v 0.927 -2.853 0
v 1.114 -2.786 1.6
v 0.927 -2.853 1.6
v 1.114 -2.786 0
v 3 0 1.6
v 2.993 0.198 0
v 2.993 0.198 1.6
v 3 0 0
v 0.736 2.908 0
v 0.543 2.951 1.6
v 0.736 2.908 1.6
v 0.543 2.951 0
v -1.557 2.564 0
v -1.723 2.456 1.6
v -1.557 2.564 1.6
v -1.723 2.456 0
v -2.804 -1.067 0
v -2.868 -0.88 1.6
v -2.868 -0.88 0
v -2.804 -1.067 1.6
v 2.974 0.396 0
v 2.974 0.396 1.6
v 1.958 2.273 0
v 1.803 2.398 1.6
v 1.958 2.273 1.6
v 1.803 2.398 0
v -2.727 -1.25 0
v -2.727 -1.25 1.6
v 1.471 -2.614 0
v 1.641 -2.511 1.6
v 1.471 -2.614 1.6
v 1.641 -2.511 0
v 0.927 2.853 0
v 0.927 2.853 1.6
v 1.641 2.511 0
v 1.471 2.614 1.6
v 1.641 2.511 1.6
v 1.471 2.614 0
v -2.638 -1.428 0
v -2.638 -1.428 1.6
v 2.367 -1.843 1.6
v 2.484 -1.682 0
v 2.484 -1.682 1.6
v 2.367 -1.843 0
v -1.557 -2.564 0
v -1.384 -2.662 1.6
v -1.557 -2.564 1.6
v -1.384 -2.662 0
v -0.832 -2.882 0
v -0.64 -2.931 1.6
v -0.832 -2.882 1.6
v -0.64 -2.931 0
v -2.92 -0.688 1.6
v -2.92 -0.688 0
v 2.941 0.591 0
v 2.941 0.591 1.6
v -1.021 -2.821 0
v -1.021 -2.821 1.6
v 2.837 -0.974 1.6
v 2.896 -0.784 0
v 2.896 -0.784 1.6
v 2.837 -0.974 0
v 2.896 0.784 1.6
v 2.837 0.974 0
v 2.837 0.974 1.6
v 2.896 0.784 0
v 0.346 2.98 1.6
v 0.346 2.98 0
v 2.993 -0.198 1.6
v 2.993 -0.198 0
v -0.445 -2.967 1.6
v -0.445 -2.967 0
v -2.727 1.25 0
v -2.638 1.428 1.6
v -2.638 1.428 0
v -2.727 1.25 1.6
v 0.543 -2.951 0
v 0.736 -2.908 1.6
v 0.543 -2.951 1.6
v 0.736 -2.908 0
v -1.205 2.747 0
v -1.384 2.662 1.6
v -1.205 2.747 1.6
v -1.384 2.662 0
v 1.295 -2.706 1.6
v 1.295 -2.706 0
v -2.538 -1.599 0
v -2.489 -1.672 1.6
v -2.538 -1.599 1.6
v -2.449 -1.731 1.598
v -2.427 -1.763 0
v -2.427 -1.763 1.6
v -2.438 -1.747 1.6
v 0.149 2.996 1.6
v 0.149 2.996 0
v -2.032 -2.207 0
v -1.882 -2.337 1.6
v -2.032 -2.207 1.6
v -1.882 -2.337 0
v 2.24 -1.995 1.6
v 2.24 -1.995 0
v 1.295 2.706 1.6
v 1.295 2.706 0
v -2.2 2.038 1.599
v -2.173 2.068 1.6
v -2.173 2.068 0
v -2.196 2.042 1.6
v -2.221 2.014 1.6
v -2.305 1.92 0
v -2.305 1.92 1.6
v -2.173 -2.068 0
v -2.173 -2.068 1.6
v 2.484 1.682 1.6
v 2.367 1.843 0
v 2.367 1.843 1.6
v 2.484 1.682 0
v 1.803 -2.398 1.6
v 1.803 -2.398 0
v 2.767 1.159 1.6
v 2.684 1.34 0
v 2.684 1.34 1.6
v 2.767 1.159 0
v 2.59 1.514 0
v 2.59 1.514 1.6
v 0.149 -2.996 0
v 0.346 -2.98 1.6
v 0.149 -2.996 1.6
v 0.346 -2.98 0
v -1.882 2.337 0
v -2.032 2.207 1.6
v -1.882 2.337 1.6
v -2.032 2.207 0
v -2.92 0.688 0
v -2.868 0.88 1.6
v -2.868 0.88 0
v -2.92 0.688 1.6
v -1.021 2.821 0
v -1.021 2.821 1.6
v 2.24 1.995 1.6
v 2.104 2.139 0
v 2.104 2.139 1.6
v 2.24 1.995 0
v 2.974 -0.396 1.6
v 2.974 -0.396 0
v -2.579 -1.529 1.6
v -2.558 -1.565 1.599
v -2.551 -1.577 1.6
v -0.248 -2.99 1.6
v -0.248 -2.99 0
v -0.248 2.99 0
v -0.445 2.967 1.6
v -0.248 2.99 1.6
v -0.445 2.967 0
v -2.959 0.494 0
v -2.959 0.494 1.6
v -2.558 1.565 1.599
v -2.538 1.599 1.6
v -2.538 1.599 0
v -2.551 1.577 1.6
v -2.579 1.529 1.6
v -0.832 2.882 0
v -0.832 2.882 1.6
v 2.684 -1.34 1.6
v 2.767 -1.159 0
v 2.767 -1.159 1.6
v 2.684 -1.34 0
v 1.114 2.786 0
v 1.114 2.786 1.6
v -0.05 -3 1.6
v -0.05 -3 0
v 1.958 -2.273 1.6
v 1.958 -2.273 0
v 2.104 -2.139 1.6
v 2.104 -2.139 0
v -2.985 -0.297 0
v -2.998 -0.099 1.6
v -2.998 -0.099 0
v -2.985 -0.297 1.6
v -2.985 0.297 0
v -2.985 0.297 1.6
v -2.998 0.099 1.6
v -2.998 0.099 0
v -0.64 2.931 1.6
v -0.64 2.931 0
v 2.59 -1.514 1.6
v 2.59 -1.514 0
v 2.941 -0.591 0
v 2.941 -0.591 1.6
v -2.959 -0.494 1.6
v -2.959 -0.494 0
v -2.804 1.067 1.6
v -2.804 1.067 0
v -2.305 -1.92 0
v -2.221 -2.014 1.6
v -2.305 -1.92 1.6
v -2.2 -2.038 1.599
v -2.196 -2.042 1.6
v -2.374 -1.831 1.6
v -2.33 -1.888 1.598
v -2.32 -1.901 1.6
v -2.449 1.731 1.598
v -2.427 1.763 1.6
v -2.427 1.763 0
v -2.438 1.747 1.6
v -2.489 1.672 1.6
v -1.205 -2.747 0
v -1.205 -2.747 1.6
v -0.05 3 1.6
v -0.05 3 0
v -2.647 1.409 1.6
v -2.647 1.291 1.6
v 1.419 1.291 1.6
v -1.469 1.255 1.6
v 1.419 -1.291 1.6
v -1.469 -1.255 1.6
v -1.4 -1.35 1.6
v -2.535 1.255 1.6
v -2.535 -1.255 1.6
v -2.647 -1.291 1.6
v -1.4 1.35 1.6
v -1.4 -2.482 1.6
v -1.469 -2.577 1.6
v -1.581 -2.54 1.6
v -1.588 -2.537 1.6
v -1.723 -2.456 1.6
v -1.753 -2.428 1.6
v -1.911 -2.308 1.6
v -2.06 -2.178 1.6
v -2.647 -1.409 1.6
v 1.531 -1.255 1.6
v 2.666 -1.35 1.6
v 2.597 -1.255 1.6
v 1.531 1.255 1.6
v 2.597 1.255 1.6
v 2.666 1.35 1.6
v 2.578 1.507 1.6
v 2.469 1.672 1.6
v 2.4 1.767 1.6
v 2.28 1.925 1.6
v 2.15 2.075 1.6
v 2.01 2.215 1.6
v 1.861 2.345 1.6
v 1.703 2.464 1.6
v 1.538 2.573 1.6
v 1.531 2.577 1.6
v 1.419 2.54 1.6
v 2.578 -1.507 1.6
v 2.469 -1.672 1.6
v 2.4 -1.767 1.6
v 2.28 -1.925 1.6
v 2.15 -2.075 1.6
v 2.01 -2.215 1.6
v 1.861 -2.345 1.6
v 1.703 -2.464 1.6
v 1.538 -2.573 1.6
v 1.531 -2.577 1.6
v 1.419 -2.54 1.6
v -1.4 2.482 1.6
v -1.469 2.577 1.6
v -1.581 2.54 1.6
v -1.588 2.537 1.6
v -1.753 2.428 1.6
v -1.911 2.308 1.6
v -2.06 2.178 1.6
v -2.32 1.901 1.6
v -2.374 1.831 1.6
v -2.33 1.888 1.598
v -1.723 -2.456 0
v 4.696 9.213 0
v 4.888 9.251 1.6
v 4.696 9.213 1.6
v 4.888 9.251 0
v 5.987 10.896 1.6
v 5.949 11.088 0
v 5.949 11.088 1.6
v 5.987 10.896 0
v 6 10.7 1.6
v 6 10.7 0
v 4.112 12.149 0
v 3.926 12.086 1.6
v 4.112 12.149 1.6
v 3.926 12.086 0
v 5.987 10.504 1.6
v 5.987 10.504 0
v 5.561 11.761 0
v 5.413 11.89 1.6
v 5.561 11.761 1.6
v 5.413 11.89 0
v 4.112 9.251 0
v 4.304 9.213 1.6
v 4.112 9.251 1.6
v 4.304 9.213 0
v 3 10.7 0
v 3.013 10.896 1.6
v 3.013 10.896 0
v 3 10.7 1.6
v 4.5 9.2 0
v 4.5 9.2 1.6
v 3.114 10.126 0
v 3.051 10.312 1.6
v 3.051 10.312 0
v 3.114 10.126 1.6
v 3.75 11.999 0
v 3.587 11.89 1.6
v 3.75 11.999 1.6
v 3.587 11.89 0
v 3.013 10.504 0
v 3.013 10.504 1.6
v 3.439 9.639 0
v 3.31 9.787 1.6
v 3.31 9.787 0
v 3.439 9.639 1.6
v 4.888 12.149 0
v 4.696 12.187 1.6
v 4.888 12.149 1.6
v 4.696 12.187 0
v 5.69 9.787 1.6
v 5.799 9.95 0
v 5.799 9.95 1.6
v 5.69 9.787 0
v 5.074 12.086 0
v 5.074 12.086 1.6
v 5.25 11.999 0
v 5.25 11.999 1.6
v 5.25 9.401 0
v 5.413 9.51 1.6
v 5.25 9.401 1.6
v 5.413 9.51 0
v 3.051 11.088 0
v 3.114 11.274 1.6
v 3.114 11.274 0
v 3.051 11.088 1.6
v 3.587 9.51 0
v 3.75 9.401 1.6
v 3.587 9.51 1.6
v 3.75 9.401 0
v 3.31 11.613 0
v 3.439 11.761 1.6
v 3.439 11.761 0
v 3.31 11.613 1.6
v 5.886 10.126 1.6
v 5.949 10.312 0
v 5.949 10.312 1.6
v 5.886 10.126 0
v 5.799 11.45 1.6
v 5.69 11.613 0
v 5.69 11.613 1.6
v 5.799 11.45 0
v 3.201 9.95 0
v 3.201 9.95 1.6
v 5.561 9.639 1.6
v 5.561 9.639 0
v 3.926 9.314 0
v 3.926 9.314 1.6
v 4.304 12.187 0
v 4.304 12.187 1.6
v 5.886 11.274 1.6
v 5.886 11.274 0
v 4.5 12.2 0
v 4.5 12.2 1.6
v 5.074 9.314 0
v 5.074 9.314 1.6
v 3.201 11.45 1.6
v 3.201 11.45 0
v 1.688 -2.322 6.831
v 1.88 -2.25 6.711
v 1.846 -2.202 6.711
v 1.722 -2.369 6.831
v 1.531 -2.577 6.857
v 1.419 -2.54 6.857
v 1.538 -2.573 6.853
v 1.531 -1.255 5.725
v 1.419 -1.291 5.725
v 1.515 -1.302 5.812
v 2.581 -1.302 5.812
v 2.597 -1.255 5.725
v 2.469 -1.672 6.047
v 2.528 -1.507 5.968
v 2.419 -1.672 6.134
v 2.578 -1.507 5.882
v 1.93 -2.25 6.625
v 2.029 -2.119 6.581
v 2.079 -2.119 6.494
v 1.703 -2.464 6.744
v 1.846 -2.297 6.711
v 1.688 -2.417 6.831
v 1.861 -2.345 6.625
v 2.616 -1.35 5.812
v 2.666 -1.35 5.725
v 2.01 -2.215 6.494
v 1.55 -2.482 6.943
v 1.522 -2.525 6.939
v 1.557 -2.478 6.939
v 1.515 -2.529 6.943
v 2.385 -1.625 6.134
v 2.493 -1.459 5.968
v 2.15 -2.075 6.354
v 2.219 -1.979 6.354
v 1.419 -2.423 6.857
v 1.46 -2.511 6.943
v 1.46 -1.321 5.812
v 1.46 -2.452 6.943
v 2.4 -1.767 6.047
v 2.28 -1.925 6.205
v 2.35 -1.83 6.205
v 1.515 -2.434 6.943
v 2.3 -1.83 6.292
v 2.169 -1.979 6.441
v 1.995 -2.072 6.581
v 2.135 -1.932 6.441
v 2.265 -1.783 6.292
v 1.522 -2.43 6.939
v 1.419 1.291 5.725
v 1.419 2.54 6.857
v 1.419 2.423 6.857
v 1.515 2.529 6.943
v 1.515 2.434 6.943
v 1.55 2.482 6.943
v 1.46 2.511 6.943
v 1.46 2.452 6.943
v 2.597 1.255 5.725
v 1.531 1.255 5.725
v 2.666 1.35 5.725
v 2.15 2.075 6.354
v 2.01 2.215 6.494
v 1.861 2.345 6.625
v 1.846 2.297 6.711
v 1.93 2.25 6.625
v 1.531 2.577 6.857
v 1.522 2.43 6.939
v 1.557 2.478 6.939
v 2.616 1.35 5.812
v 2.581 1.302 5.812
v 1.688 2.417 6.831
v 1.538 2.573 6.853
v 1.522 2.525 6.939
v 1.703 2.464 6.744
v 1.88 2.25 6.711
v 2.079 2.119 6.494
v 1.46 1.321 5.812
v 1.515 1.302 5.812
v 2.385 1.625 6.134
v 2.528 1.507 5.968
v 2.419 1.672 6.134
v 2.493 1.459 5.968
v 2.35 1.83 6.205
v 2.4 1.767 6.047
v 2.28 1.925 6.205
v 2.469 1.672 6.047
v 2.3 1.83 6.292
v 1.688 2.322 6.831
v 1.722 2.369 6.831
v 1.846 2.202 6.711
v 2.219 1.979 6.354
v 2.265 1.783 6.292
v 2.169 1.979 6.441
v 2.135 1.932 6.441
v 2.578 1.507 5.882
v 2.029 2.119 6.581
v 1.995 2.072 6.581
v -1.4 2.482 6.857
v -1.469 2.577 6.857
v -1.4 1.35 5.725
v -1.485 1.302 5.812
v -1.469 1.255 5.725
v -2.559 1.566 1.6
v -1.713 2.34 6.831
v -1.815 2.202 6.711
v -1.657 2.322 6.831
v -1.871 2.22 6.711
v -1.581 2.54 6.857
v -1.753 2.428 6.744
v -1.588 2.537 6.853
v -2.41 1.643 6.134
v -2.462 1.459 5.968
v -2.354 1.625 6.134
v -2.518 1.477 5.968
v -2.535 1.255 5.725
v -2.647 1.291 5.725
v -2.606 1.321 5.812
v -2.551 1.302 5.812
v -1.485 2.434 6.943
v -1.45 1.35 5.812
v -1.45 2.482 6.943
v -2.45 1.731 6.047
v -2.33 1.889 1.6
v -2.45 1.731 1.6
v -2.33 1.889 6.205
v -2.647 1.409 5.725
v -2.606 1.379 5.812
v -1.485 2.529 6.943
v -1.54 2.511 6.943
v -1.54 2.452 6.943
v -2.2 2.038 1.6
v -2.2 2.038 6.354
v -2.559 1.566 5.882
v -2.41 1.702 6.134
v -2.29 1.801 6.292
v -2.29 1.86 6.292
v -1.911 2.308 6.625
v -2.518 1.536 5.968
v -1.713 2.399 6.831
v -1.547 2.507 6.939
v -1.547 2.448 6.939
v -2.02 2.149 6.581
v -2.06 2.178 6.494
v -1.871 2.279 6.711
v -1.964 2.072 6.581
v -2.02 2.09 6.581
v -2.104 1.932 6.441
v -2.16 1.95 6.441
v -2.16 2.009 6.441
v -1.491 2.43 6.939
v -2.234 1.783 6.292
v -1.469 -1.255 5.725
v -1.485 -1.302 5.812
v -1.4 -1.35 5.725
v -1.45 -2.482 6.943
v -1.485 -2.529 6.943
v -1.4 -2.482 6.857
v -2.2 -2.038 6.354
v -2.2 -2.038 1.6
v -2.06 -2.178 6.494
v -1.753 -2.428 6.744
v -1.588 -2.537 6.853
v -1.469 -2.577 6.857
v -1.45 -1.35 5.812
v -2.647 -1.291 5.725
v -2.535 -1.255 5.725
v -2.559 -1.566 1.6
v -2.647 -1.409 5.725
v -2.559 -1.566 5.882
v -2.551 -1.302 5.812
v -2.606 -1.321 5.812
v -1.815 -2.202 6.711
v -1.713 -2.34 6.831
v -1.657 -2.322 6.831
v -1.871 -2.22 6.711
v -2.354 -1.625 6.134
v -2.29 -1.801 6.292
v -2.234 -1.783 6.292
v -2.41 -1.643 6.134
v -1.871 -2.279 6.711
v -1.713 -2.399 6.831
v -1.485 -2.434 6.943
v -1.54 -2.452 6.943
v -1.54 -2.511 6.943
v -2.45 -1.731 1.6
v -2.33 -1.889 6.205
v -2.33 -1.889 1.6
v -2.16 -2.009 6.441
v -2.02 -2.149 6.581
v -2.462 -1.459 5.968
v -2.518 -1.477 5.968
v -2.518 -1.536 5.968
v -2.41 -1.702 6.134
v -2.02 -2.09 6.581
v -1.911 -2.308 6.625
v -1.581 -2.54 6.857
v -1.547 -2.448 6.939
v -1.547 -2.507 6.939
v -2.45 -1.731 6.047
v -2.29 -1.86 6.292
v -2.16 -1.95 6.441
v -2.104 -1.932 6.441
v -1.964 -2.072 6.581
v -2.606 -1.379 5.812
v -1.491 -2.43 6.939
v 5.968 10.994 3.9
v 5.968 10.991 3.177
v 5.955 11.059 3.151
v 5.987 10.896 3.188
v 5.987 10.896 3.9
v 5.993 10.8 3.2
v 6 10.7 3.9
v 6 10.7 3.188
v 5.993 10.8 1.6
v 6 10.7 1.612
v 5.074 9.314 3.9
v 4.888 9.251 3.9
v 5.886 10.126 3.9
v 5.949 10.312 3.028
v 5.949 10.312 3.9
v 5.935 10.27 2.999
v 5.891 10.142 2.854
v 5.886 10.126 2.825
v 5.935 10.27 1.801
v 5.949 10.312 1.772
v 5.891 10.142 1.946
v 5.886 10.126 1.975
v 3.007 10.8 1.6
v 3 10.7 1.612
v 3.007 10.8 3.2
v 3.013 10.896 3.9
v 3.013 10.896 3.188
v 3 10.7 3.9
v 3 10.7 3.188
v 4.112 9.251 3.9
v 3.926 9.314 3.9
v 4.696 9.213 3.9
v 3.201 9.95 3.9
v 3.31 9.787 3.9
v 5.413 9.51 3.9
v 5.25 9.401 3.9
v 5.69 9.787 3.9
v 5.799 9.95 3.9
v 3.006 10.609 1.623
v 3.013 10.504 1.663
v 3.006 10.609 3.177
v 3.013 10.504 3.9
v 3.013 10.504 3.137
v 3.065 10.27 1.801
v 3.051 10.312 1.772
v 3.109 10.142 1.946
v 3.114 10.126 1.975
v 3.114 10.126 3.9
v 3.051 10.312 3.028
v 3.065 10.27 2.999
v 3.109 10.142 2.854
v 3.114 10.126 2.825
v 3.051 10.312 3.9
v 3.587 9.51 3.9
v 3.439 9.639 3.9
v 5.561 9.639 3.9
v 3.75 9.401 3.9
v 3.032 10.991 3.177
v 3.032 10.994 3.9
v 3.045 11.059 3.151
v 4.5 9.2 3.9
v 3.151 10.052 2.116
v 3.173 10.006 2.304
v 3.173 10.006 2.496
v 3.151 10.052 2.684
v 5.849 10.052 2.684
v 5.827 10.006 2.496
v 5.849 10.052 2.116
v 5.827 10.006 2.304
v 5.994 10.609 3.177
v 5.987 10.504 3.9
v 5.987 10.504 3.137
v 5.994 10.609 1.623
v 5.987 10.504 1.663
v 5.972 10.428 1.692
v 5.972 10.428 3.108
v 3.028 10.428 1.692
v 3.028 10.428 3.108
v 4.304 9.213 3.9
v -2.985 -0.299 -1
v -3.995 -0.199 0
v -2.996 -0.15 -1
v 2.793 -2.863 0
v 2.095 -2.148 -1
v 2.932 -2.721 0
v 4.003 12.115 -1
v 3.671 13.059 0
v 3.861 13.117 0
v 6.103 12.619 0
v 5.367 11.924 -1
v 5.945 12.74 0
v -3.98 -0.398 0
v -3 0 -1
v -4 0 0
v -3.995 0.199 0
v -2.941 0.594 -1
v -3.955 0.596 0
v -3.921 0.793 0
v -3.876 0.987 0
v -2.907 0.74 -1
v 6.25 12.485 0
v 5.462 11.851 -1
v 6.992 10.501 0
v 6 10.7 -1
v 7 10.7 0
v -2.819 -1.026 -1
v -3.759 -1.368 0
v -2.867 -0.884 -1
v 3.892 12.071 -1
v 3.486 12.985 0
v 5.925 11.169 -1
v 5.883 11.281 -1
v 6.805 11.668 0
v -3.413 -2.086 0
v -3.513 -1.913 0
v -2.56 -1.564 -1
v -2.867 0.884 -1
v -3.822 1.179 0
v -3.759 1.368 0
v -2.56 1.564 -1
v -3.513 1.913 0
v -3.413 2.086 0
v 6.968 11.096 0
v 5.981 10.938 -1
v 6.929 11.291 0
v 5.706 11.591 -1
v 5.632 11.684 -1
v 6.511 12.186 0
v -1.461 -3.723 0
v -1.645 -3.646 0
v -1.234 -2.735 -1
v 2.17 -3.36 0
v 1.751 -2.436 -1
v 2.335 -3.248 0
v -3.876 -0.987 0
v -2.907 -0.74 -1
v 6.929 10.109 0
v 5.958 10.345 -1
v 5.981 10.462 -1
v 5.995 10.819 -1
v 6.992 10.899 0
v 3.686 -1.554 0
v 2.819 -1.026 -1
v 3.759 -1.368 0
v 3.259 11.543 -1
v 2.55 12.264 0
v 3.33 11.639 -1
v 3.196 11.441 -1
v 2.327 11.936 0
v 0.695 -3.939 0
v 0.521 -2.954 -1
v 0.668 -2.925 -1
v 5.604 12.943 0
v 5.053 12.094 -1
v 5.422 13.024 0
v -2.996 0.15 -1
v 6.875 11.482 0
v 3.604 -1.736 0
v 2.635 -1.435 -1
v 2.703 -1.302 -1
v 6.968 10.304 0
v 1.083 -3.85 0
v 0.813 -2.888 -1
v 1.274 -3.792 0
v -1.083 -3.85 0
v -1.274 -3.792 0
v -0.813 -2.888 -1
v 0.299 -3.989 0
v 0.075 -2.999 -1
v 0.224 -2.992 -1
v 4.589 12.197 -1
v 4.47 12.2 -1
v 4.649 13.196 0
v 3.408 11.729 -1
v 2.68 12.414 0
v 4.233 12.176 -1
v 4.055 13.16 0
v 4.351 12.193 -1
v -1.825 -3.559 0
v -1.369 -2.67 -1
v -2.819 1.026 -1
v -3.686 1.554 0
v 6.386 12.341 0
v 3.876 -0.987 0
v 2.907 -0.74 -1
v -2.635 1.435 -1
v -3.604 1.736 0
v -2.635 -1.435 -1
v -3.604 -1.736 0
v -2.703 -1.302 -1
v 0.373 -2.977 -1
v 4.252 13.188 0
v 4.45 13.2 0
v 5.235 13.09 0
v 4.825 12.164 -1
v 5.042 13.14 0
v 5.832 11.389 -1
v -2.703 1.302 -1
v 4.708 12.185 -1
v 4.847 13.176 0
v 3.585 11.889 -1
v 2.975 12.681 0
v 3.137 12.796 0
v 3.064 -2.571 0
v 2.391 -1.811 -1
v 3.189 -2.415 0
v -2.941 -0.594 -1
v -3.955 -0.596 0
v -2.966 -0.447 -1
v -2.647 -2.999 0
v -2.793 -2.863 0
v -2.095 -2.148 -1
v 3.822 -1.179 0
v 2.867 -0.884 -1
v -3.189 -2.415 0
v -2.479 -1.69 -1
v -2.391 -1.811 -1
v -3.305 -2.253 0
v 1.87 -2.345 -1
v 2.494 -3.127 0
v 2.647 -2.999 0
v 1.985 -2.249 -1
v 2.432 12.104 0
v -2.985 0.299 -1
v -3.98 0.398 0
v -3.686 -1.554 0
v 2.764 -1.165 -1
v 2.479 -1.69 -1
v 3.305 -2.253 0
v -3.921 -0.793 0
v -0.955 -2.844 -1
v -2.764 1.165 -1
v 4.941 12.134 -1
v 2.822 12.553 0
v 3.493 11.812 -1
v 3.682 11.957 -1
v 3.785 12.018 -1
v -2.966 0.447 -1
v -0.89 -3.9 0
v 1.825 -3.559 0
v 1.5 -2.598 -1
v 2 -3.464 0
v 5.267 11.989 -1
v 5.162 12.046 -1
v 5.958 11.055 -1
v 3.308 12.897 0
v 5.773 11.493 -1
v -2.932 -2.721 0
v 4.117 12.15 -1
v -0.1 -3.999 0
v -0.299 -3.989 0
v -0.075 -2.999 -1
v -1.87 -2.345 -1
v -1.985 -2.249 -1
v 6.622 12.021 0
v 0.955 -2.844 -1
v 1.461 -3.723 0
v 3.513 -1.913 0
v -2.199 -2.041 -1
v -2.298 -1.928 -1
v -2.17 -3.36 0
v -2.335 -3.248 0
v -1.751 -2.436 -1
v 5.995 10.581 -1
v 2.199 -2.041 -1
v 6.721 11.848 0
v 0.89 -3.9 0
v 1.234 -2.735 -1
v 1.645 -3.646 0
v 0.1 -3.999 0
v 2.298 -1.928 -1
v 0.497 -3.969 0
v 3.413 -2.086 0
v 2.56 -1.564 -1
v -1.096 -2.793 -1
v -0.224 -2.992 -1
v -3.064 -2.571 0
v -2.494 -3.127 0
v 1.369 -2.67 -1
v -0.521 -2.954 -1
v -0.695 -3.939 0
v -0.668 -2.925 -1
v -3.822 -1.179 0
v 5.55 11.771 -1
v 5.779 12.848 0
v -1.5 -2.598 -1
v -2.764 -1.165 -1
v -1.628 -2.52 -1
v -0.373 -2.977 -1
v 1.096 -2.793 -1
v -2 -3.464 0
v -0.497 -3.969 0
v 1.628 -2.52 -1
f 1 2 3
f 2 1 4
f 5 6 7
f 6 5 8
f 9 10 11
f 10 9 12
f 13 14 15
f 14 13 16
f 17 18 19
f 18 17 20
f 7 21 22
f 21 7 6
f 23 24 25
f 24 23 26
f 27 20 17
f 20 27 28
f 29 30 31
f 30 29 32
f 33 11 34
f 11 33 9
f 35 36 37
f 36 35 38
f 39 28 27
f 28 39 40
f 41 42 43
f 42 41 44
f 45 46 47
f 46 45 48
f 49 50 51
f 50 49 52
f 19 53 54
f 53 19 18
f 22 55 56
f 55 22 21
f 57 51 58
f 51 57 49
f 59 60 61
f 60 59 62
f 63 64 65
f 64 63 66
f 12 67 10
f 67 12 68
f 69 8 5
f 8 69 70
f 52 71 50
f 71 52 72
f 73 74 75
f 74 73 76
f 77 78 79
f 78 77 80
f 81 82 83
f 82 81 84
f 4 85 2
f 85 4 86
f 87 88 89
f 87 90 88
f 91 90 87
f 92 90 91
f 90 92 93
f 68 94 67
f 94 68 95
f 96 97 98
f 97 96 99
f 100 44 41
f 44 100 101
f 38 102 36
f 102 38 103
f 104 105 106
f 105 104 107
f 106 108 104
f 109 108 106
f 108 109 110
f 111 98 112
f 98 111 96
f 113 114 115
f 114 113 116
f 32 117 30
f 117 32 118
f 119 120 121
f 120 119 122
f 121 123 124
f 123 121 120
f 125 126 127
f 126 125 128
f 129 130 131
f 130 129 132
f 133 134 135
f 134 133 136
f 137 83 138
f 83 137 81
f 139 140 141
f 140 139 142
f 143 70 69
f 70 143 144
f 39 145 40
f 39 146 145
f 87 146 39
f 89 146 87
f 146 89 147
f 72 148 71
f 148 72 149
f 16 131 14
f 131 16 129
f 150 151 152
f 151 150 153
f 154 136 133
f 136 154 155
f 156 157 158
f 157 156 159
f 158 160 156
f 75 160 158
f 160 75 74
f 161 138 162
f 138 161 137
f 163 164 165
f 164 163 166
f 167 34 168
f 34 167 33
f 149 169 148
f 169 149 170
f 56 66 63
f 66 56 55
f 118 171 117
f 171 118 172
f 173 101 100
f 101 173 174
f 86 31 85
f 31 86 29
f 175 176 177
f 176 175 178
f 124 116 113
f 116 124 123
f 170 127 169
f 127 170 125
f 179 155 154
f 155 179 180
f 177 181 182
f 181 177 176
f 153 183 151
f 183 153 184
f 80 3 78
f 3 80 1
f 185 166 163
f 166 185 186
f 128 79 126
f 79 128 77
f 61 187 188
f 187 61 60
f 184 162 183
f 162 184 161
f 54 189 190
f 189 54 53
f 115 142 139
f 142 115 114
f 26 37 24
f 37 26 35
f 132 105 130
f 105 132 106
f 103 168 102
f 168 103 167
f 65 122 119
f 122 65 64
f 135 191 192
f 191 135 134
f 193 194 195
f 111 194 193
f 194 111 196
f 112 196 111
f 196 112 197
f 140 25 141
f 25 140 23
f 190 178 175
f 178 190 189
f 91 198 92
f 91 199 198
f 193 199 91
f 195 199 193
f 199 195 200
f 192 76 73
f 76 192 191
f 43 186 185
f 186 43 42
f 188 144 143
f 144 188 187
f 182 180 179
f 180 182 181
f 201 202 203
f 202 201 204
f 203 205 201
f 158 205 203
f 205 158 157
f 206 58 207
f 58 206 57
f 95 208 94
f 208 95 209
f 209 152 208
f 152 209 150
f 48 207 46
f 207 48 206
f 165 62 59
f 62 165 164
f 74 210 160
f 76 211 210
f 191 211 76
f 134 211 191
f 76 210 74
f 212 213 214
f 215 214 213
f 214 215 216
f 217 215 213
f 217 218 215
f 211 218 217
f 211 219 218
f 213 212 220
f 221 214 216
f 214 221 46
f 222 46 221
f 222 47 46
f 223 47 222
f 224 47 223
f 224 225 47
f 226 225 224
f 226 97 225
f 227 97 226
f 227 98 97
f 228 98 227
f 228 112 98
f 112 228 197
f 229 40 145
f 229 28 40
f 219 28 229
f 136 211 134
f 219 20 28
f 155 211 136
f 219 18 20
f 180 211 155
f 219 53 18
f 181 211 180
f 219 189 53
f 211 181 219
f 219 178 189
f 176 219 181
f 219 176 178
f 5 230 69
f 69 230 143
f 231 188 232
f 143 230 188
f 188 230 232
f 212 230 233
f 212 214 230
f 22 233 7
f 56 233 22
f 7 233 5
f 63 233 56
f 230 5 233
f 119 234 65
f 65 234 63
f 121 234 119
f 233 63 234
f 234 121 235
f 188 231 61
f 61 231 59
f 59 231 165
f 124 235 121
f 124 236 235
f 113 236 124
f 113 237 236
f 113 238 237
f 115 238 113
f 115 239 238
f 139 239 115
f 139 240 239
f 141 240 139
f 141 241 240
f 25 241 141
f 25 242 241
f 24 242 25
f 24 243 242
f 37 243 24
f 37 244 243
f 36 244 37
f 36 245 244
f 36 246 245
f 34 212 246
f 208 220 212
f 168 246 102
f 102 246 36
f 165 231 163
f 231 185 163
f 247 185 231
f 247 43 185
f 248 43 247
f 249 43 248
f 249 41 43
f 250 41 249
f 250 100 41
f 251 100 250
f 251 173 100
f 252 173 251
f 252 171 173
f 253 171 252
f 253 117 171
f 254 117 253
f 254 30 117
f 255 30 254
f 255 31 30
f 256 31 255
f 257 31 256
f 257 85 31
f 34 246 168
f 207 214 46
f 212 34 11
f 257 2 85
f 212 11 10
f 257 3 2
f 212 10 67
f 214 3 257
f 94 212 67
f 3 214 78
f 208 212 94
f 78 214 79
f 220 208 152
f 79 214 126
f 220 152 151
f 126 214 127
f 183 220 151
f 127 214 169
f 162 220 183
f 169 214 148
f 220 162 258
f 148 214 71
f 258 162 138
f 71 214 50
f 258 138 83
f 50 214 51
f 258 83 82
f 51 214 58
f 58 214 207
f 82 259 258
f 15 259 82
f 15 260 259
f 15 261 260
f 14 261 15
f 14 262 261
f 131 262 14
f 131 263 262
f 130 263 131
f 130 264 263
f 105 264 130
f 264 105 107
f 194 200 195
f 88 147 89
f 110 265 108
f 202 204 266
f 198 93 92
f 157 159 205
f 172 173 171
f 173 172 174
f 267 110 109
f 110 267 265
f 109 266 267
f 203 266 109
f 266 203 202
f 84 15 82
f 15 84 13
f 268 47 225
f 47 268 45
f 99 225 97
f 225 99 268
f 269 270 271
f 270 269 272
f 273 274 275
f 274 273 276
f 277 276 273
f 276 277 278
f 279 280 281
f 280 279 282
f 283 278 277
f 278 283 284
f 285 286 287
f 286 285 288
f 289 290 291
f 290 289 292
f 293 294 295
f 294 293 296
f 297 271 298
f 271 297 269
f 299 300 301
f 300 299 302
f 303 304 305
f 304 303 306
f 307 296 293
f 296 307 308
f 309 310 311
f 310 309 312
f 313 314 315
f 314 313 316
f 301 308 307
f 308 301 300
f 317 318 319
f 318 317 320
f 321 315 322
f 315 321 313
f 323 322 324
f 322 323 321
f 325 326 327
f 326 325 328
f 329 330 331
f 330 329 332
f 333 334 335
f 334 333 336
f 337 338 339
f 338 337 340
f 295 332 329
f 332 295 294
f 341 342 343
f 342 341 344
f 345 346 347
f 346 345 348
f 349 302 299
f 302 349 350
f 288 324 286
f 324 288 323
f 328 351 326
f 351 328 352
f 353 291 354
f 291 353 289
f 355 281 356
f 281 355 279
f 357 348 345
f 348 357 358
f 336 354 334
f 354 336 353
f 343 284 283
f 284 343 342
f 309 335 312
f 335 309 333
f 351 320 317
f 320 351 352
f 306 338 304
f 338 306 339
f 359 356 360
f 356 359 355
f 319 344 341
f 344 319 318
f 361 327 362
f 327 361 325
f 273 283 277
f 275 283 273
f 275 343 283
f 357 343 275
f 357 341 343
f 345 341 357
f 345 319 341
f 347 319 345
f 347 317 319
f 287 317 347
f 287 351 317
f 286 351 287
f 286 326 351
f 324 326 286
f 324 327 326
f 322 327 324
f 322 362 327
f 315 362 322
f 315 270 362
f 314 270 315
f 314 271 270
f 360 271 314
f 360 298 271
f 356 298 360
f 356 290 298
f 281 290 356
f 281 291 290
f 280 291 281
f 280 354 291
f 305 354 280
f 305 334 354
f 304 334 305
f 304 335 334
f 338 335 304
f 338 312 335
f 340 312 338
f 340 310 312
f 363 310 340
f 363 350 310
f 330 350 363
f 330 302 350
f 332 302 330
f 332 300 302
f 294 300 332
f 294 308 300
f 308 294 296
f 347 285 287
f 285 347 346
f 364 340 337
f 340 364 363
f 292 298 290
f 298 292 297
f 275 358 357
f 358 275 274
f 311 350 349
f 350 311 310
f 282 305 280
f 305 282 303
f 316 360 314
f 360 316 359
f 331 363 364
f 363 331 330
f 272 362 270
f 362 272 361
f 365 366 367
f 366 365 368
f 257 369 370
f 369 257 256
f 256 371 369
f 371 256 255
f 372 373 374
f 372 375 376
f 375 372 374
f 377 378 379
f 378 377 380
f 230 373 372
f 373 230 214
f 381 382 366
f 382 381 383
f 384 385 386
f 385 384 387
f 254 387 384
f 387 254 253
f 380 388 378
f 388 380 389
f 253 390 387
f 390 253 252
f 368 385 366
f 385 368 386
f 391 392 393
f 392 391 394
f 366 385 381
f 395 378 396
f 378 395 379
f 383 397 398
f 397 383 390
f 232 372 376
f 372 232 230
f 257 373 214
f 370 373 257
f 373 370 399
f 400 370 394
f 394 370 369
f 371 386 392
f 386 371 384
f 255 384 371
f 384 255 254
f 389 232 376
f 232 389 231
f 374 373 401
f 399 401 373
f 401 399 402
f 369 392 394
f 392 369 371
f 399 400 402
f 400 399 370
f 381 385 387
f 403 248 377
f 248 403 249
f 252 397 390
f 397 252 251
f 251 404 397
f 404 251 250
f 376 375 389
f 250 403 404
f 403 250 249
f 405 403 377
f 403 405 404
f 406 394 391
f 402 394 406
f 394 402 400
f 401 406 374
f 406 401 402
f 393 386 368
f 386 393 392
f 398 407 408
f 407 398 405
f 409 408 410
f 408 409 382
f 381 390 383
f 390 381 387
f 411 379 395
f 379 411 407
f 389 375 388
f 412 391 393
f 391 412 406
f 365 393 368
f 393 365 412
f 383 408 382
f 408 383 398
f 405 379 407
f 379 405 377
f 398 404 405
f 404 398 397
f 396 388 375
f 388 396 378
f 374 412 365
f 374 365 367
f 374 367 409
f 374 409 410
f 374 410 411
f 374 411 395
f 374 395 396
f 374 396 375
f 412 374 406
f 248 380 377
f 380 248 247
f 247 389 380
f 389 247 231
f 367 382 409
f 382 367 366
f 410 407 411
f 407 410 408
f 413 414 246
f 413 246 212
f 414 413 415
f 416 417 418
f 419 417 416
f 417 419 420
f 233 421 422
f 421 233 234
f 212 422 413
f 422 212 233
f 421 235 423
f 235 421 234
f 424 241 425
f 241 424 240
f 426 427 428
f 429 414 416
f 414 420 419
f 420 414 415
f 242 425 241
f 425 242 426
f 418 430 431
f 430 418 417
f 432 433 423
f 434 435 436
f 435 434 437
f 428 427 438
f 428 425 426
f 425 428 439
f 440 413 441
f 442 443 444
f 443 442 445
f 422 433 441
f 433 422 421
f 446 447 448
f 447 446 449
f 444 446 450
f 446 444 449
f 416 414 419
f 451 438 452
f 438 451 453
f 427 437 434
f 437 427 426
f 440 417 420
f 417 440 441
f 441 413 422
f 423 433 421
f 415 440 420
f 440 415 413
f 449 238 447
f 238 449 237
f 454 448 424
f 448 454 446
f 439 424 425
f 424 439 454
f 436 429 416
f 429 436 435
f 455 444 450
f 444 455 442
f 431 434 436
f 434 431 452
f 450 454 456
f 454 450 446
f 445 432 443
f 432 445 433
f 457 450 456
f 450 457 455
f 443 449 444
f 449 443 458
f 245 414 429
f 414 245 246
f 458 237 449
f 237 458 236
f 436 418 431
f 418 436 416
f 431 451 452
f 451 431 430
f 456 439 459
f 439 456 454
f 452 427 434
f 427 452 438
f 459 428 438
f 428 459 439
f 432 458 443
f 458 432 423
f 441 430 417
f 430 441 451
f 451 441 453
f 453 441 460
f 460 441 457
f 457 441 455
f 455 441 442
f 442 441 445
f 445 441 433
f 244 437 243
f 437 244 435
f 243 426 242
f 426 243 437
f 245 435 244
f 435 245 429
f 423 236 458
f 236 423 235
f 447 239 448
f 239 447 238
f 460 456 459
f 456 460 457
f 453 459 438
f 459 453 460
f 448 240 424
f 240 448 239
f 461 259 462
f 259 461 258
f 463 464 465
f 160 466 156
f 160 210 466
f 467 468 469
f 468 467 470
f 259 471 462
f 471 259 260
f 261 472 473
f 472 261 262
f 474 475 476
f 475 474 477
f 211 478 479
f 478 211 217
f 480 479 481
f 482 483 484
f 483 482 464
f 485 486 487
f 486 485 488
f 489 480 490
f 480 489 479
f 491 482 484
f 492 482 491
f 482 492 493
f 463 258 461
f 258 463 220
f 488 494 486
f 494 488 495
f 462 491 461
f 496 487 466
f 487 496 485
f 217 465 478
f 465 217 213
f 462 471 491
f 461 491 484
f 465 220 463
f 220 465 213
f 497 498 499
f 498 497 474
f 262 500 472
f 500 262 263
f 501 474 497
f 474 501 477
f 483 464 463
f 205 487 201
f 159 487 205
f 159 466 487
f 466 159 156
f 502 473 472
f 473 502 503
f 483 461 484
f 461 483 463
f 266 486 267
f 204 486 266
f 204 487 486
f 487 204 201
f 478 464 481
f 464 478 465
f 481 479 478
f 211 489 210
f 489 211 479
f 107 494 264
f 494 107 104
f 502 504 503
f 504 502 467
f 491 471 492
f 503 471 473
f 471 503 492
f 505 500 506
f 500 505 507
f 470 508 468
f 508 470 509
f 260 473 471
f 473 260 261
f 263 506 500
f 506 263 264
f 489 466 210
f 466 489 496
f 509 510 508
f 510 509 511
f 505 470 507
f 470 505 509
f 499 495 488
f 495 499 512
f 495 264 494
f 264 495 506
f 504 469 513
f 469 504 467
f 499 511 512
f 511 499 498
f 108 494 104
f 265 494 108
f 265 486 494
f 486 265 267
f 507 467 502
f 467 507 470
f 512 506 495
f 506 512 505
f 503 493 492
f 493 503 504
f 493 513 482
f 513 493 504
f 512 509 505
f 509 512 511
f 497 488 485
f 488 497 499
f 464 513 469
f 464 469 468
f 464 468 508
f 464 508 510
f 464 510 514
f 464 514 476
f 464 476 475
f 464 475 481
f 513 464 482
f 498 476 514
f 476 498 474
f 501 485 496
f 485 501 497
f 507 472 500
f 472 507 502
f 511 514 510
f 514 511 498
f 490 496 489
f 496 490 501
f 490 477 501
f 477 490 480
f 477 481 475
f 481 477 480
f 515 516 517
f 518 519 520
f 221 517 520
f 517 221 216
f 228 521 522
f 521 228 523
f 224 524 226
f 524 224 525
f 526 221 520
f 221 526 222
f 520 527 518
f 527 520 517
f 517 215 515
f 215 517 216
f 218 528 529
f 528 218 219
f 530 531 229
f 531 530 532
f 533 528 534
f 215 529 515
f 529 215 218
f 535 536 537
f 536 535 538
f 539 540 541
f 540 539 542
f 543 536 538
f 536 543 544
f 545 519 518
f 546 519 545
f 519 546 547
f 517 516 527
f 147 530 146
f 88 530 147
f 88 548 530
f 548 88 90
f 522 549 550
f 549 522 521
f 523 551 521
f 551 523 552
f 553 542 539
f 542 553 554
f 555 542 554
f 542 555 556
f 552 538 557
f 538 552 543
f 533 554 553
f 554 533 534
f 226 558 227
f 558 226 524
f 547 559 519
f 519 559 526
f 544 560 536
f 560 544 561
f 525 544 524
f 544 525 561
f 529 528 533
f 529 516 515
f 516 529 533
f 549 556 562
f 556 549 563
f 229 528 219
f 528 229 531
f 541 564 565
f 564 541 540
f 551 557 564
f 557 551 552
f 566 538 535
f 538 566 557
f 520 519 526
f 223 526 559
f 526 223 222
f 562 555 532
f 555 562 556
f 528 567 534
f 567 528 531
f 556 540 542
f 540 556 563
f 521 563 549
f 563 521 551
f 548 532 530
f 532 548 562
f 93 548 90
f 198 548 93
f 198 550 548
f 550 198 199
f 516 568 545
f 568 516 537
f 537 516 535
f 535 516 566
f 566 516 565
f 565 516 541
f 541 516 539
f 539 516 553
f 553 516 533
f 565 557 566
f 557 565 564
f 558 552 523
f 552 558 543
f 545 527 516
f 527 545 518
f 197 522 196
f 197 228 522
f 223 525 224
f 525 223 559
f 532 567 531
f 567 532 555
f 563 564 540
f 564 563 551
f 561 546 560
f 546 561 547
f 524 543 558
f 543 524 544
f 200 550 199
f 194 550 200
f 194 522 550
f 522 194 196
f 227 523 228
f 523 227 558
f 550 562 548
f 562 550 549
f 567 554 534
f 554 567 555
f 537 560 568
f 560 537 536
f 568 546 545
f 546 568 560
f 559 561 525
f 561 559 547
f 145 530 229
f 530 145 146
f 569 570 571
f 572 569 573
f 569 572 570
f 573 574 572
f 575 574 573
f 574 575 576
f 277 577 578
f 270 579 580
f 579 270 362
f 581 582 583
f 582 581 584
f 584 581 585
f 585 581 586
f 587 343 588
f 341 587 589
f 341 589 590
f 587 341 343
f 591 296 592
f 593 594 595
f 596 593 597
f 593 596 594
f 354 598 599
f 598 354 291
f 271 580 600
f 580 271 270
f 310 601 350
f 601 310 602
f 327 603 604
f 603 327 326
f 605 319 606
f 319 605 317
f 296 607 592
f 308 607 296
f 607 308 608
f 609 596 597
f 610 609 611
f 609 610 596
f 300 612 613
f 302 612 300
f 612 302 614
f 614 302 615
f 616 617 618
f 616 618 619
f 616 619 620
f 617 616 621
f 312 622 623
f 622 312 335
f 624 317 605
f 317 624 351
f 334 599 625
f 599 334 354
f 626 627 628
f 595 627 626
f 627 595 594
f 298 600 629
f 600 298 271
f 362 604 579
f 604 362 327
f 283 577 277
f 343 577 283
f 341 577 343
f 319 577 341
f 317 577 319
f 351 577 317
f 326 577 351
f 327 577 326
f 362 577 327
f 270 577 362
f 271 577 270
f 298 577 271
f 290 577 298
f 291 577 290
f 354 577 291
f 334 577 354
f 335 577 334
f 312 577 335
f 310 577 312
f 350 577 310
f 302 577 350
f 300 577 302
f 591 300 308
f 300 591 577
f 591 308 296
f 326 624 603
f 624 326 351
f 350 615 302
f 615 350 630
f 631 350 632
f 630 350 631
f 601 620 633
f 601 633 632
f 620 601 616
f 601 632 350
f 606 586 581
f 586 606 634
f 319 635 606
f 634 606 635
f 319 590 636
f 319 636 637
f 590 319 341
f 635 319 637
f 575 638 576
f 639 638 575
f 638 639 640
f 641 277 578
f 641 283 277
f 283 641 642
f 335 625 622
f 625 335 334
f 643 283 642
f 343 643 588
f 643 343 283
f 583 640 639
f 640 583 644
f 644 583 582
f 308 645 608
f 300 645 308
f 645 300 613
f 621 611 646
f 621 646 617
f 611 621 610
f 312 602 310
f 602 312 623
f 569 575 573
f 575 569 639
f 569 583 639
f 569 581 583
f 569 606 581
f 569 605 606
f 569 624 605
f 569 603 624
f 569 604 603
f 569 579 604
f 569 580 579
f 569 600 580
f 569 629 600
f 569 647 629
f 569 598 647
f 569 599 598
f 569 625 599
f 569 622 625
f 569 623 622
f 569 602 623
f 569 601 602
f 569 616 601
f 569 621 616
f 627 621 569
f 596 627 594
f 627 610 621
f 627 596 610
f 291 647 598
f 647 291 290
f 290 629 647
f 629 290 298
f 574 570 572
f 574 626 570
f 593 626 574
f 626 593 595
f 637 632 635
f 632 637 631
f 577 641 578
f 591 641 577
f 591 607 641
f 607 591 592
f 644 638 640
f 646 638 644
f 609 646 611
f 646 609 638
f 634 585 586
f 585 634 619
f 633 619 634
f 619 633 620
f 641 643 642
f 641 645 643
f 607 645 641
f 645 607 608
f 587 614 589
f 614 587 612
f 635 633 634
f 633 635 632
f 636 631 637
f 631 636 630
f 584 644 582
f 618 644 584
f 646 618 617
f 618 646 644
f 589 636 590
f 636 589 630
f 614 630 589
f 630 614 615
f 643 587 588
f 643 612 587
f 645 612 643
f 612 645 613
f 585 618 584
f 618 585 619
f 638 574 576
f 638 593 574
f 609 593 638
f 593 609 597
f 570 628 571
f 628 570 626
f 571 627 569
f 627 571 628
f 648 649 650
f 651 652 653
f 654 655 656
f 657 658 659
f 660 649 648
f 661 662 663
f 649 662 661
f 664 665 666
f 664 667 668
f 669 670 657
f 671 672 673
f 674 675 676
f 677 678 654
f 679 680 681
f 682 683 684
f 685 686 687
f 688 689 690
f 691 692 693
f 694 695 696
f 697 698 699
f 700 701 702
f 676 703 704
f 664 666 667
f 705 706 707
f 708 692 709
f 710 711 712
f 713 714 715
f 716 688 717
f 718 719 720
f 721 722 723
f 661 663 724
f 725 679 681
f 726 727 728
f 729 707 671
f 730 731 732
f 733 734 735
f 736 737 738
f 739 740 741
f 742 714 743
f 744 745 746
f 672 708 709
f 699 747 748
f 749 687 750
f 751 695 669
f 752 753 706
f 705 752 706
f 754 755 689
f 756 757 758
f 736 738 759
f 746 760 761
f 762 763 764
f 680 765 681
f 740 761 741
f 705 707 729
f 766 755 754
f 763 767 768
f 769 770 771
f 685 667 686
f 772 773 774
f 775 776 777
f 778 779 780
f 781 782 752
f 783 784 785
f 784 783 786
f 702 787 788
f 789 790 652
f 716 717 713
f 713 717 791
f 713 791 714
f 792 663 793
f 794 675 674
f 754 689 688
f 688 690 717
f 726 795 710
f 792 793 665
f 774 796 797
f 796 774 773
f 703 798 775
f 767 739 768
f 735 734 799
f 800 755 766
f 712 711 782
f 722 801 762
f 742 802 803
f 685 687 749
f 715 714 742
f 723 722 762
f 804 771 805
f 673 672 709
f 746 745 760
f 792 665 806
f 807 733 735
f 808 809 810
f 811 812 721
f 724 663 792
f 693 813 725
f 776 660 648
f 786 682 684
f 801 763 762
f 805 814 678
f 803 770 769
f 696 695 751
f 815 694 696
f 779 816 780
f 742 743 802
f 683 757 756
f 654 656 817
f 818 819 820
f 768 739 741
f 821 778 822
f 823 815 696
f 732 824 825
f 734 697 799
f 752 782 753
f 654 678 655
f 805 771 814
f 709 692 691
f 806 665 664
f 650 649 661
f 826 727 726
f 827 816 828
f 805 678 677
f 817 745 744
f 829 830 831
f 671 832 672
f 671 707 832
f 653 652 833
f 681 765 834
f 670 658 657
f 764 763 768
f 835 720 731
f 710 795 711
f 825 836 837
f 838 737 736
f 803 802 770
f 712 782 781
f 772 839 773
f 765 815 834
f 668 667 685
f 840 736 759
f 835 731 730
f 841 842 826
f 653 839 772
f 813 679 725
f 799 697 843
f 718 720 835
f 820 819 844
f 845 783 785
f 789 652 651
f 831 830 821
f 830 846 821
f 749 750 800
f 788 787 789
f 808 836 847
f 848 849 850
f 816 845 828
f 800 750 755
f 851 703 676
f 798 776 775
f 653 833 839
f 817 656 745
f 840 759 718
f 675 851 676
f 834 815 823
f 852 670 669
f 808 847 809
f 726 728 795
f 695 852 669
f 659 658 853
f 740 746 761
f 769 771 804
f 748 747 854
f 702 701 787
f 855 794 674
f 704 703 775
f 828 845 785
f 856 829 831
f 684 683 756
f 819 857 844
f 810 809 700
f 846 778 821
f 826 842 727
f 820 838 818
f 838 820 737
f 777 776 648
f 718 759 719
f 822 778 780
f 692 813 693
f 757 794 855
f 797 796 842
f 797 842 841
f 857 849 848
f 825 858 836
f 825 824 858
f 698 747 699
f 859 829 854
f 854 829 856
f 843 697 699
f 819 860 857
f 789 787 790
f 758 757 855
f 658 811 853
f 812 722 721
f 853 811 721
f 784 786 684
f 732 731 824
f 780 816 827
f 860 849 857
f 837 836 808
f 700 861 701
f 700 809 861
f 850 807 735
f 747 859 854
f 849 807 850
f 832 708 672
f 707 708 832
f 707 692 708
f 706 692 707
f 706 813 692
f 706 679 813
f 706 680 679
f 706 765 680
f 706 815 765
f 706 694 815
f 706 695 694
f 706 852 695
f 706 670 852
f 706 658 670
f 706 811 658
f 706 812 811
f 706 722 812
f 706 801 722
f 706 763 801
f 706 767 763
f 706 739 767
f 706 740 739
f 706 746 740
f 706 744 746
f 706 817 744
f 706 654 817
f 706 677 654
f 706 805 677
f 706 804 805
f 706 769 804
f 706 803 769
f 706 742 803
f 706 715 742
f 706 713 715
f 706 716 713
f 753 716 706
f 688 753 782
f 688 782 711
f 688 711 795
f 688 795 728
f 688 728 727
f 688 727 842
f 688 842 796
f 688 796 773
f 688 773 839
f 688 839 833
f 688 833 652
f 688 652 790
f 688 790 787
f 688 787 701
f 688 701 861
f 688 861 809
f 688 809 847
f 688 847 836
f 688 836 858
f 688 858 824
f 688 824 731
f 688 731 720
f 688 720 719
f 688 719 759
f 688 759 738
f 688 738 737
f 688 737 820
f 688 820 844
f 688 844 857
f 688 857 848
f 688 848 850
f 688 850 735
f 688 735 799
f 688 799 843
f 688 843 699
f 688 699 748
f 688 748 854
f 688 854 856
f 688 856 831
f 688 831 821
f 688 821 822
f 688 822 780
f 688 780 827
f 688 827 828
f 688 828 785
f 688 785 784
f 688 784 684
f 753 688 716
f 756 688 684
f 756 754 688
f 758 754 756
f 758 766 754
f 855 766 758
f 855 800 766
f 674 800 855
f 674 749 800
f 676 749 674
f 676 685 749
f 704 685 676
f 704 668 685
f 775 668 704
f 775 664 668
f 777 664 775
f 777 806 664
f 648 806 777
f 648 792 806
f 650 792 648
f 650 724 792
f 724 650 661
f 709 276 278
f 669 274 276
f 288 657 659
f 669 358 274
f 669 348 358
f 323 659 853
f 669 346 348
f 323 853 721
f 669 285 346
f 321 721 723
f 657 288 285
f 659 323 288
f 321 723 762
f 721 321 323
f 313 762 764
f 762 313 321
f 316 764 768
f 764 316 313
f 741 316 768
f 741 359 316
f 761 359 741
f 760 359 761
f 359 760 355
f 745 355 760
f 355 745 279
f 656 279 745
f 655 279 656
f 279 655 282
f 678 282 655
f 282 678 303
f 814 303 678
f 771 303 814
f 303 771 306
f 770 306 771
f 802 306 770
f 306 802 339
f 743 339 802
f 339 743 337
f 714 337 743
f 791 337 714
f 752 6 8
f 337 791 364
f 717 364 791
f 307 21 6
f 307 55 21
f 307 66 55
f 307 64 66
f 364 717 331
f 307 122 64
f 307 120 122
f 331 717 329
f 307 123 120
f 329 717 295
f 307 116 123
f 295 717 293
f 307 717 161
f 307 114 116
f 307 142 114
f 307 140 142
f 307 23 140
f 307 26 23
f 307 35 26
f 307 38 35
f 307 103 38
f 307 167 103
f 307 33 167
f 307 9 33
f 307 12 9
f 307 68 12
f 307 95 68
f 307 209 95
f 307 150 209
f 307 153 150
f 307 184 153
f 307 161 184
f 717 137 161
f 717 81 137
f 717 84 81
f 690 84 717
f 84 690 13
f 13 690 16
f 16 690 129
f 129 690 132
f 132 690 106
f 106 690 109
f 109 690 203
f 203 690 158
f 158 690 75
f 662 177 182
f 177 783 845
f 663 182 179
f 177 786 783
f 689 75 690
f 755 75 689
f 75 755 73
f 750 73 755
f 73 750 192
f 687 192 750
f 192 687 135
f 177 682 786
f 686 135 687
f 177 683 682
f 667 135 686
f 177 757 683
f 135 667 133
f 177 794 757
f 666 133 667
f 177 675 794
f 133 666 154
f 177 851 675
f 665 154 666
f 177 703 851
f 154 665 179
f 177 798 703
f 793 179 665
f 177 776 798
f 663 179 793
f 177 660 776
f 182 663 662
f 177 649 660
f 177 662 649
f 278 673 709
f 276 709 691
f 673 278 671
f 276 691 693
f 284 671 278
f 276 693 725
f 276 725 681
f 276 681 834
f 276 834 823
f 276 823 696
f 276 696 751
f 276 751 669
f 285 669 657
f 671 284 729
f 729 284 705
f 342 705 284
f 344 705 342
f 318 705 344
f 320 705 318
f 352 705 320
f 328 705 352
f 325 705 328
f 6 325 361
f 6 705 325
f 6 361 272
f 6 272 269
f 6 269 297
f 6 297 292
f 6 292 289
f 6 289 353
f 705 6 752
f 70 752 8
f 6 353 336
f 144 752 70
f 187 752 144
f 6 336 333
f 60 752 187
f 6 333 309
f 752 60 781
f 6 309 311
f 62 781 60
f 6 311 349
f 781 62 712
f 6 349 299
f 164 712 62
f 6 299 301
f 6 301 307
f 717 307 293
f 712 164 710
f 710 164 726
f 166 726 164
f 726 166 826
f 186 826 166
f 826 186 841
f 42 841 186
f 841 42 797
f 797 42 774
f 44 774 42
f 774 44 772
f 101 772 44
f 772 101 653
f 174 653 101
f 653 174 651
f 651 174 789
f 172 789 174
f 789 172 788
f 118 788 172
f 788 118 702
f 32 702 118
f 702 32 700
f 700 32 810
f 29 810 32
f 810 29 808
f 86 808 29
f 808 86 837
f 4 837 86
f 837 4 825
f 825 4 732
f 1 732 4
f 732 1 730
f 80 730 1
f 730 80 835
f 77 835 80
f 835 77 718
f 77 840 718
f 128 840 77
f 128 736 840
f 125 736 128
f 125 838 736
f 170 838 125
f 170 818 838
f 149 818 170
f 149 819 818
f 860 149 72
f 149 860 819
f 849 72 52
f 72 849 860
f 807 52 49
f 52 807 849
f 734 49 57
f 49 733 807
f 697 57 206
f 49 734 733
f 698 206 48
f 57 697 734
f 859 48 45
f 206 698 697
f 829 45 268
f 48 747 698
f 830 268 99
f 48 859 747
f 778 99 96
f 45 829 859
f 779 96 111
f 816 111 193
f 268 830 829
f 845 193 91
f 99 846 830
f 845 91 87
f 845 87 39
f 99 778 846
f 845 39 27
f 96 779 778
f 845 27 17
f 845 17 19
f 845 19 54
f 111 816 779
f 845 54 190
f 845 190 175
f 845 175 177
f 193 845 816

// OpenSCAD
$fa = 1;
$fs = 0.2;

side = "right"; // [right, left]

large_hole_diameter = 6;
small_hole_diameter = 3;
hole_offset_x = 4.5;
hole_offset_y = 10.7;
under_pcb_thickness = 1;
pcb_thickness = 1.6;
key_stabilizer_hole_height = 2.7;
key_stabilizer_depth = 5.85;
key_stabilizer_rod_window_width = 3;
rod_diameter = 1.6;
rod_holder_depth = 2.3;
rod_offset = 0.1;
rod_lip = 0.1;
key_inner_angle = 5;
key_edge_offset = 0.4;
rounding = 0.1;

key_stabilizer_hole_width = large_hole_diameter + 1;

// Under PCB hole base
module hole_base(hole_diameter) {
  translate([0, 0, -under_pcb_thickness / 2])
    cylinder(h = under_pcb_thickness, r1 = hole_diameter / 2, r2 = hole_diameter / 2 + under_pcb_thickness, center = true);
}

scale([side == "right" ? 1 : -1, 1, 1]) {
  union() {
    // Under PCB base
    hull() {
      hole_base(large_hole_diameter);
      translate([hole_offset_x, hole_offset_y, 0])
        hole_base(small_hole_diameter);
    }

    // In-hole filling
    translate([0, 0, pcb_thickness / 2 - under_pcb_thickness / 4]) {
      cylinder(h = pcb_thickness + under_pcb_thickness / 2, r = large_hole_diameter / 2, center = true);
      translate([hole_offset_x, hole_offset_y, 0])
        cylinder(h = pcb_thickness + under_pcb_thickness / 2, r = small_hole_diameter / 2, center = true);
    }

    // Key stabilizer guides
    minkowski() {
      difference() {
        translate([0, 0, key_stabilizer_depth / 2 + pcb_thickness]) {
          difference() {
            cylinder(h = key_stabilizer_depth, r = large_hole_diameter / 2 - rounding, center = true);
            translate([0, 0, key_stabilizer_depth - large_hole_diameter / 2])
              rotate([45, 0, 0])
                cube([large_hole_diameter, large_hole_diameter / sqrt(2), large_hole_diameter / sqrt(2)], center = true);
          }
        }

        // Space for the key stabilizer and rod to travel
        translate([0, 0, key_stabilizer_depth / 2 + pcb_thickness + 0.5]) {
          cube([key_stabilizer_hole_width, key_stabilizer_hole_height, key_stabilizer_depth + 1], center = true);
          cube([key_stabilizer_rod_window_width, key_stabilizer_hole_width, key_stabilizer_depth + 1], center = true);
        }
      }
      sphere(r = rounding);
    }

    // Rod holder
    translate([hole_offset_x, hole_offset_y, rod_holder_depth / 2 + pcb_thickness]) {
      difference() {
        cylinder(r = small_hole_diameter / 2, h = rod_holder_depth, center = true);
        translate([0, rod_offset, rod_diameter / 2 - rod_holder_depth / 2])
          rotate([0, 90, 0])
            cylinder(r = rod_diameter / 2, h = small_hole_diameter, center = true);
        translate([0, (small_hole_diameter - small_hole_diameter / 2 + rod_offset) / 2,  (rod_diameter - rod_lip - rod_holder_depth) / 2])
          cube([small_hole_diameter, small_hole_diameter / 2 - rod_offset, rod_diameter - rod_lip], center = true);
        translate([0, small_hole_diameter / 2 + key_edge_offset, 0])
          rotate([key_inner_angle, 0, 0])
            cube([small_hole_diameter, small_hole_diameter, rod_holder_depth * 2], center = true);
      }
    }
  }
}
